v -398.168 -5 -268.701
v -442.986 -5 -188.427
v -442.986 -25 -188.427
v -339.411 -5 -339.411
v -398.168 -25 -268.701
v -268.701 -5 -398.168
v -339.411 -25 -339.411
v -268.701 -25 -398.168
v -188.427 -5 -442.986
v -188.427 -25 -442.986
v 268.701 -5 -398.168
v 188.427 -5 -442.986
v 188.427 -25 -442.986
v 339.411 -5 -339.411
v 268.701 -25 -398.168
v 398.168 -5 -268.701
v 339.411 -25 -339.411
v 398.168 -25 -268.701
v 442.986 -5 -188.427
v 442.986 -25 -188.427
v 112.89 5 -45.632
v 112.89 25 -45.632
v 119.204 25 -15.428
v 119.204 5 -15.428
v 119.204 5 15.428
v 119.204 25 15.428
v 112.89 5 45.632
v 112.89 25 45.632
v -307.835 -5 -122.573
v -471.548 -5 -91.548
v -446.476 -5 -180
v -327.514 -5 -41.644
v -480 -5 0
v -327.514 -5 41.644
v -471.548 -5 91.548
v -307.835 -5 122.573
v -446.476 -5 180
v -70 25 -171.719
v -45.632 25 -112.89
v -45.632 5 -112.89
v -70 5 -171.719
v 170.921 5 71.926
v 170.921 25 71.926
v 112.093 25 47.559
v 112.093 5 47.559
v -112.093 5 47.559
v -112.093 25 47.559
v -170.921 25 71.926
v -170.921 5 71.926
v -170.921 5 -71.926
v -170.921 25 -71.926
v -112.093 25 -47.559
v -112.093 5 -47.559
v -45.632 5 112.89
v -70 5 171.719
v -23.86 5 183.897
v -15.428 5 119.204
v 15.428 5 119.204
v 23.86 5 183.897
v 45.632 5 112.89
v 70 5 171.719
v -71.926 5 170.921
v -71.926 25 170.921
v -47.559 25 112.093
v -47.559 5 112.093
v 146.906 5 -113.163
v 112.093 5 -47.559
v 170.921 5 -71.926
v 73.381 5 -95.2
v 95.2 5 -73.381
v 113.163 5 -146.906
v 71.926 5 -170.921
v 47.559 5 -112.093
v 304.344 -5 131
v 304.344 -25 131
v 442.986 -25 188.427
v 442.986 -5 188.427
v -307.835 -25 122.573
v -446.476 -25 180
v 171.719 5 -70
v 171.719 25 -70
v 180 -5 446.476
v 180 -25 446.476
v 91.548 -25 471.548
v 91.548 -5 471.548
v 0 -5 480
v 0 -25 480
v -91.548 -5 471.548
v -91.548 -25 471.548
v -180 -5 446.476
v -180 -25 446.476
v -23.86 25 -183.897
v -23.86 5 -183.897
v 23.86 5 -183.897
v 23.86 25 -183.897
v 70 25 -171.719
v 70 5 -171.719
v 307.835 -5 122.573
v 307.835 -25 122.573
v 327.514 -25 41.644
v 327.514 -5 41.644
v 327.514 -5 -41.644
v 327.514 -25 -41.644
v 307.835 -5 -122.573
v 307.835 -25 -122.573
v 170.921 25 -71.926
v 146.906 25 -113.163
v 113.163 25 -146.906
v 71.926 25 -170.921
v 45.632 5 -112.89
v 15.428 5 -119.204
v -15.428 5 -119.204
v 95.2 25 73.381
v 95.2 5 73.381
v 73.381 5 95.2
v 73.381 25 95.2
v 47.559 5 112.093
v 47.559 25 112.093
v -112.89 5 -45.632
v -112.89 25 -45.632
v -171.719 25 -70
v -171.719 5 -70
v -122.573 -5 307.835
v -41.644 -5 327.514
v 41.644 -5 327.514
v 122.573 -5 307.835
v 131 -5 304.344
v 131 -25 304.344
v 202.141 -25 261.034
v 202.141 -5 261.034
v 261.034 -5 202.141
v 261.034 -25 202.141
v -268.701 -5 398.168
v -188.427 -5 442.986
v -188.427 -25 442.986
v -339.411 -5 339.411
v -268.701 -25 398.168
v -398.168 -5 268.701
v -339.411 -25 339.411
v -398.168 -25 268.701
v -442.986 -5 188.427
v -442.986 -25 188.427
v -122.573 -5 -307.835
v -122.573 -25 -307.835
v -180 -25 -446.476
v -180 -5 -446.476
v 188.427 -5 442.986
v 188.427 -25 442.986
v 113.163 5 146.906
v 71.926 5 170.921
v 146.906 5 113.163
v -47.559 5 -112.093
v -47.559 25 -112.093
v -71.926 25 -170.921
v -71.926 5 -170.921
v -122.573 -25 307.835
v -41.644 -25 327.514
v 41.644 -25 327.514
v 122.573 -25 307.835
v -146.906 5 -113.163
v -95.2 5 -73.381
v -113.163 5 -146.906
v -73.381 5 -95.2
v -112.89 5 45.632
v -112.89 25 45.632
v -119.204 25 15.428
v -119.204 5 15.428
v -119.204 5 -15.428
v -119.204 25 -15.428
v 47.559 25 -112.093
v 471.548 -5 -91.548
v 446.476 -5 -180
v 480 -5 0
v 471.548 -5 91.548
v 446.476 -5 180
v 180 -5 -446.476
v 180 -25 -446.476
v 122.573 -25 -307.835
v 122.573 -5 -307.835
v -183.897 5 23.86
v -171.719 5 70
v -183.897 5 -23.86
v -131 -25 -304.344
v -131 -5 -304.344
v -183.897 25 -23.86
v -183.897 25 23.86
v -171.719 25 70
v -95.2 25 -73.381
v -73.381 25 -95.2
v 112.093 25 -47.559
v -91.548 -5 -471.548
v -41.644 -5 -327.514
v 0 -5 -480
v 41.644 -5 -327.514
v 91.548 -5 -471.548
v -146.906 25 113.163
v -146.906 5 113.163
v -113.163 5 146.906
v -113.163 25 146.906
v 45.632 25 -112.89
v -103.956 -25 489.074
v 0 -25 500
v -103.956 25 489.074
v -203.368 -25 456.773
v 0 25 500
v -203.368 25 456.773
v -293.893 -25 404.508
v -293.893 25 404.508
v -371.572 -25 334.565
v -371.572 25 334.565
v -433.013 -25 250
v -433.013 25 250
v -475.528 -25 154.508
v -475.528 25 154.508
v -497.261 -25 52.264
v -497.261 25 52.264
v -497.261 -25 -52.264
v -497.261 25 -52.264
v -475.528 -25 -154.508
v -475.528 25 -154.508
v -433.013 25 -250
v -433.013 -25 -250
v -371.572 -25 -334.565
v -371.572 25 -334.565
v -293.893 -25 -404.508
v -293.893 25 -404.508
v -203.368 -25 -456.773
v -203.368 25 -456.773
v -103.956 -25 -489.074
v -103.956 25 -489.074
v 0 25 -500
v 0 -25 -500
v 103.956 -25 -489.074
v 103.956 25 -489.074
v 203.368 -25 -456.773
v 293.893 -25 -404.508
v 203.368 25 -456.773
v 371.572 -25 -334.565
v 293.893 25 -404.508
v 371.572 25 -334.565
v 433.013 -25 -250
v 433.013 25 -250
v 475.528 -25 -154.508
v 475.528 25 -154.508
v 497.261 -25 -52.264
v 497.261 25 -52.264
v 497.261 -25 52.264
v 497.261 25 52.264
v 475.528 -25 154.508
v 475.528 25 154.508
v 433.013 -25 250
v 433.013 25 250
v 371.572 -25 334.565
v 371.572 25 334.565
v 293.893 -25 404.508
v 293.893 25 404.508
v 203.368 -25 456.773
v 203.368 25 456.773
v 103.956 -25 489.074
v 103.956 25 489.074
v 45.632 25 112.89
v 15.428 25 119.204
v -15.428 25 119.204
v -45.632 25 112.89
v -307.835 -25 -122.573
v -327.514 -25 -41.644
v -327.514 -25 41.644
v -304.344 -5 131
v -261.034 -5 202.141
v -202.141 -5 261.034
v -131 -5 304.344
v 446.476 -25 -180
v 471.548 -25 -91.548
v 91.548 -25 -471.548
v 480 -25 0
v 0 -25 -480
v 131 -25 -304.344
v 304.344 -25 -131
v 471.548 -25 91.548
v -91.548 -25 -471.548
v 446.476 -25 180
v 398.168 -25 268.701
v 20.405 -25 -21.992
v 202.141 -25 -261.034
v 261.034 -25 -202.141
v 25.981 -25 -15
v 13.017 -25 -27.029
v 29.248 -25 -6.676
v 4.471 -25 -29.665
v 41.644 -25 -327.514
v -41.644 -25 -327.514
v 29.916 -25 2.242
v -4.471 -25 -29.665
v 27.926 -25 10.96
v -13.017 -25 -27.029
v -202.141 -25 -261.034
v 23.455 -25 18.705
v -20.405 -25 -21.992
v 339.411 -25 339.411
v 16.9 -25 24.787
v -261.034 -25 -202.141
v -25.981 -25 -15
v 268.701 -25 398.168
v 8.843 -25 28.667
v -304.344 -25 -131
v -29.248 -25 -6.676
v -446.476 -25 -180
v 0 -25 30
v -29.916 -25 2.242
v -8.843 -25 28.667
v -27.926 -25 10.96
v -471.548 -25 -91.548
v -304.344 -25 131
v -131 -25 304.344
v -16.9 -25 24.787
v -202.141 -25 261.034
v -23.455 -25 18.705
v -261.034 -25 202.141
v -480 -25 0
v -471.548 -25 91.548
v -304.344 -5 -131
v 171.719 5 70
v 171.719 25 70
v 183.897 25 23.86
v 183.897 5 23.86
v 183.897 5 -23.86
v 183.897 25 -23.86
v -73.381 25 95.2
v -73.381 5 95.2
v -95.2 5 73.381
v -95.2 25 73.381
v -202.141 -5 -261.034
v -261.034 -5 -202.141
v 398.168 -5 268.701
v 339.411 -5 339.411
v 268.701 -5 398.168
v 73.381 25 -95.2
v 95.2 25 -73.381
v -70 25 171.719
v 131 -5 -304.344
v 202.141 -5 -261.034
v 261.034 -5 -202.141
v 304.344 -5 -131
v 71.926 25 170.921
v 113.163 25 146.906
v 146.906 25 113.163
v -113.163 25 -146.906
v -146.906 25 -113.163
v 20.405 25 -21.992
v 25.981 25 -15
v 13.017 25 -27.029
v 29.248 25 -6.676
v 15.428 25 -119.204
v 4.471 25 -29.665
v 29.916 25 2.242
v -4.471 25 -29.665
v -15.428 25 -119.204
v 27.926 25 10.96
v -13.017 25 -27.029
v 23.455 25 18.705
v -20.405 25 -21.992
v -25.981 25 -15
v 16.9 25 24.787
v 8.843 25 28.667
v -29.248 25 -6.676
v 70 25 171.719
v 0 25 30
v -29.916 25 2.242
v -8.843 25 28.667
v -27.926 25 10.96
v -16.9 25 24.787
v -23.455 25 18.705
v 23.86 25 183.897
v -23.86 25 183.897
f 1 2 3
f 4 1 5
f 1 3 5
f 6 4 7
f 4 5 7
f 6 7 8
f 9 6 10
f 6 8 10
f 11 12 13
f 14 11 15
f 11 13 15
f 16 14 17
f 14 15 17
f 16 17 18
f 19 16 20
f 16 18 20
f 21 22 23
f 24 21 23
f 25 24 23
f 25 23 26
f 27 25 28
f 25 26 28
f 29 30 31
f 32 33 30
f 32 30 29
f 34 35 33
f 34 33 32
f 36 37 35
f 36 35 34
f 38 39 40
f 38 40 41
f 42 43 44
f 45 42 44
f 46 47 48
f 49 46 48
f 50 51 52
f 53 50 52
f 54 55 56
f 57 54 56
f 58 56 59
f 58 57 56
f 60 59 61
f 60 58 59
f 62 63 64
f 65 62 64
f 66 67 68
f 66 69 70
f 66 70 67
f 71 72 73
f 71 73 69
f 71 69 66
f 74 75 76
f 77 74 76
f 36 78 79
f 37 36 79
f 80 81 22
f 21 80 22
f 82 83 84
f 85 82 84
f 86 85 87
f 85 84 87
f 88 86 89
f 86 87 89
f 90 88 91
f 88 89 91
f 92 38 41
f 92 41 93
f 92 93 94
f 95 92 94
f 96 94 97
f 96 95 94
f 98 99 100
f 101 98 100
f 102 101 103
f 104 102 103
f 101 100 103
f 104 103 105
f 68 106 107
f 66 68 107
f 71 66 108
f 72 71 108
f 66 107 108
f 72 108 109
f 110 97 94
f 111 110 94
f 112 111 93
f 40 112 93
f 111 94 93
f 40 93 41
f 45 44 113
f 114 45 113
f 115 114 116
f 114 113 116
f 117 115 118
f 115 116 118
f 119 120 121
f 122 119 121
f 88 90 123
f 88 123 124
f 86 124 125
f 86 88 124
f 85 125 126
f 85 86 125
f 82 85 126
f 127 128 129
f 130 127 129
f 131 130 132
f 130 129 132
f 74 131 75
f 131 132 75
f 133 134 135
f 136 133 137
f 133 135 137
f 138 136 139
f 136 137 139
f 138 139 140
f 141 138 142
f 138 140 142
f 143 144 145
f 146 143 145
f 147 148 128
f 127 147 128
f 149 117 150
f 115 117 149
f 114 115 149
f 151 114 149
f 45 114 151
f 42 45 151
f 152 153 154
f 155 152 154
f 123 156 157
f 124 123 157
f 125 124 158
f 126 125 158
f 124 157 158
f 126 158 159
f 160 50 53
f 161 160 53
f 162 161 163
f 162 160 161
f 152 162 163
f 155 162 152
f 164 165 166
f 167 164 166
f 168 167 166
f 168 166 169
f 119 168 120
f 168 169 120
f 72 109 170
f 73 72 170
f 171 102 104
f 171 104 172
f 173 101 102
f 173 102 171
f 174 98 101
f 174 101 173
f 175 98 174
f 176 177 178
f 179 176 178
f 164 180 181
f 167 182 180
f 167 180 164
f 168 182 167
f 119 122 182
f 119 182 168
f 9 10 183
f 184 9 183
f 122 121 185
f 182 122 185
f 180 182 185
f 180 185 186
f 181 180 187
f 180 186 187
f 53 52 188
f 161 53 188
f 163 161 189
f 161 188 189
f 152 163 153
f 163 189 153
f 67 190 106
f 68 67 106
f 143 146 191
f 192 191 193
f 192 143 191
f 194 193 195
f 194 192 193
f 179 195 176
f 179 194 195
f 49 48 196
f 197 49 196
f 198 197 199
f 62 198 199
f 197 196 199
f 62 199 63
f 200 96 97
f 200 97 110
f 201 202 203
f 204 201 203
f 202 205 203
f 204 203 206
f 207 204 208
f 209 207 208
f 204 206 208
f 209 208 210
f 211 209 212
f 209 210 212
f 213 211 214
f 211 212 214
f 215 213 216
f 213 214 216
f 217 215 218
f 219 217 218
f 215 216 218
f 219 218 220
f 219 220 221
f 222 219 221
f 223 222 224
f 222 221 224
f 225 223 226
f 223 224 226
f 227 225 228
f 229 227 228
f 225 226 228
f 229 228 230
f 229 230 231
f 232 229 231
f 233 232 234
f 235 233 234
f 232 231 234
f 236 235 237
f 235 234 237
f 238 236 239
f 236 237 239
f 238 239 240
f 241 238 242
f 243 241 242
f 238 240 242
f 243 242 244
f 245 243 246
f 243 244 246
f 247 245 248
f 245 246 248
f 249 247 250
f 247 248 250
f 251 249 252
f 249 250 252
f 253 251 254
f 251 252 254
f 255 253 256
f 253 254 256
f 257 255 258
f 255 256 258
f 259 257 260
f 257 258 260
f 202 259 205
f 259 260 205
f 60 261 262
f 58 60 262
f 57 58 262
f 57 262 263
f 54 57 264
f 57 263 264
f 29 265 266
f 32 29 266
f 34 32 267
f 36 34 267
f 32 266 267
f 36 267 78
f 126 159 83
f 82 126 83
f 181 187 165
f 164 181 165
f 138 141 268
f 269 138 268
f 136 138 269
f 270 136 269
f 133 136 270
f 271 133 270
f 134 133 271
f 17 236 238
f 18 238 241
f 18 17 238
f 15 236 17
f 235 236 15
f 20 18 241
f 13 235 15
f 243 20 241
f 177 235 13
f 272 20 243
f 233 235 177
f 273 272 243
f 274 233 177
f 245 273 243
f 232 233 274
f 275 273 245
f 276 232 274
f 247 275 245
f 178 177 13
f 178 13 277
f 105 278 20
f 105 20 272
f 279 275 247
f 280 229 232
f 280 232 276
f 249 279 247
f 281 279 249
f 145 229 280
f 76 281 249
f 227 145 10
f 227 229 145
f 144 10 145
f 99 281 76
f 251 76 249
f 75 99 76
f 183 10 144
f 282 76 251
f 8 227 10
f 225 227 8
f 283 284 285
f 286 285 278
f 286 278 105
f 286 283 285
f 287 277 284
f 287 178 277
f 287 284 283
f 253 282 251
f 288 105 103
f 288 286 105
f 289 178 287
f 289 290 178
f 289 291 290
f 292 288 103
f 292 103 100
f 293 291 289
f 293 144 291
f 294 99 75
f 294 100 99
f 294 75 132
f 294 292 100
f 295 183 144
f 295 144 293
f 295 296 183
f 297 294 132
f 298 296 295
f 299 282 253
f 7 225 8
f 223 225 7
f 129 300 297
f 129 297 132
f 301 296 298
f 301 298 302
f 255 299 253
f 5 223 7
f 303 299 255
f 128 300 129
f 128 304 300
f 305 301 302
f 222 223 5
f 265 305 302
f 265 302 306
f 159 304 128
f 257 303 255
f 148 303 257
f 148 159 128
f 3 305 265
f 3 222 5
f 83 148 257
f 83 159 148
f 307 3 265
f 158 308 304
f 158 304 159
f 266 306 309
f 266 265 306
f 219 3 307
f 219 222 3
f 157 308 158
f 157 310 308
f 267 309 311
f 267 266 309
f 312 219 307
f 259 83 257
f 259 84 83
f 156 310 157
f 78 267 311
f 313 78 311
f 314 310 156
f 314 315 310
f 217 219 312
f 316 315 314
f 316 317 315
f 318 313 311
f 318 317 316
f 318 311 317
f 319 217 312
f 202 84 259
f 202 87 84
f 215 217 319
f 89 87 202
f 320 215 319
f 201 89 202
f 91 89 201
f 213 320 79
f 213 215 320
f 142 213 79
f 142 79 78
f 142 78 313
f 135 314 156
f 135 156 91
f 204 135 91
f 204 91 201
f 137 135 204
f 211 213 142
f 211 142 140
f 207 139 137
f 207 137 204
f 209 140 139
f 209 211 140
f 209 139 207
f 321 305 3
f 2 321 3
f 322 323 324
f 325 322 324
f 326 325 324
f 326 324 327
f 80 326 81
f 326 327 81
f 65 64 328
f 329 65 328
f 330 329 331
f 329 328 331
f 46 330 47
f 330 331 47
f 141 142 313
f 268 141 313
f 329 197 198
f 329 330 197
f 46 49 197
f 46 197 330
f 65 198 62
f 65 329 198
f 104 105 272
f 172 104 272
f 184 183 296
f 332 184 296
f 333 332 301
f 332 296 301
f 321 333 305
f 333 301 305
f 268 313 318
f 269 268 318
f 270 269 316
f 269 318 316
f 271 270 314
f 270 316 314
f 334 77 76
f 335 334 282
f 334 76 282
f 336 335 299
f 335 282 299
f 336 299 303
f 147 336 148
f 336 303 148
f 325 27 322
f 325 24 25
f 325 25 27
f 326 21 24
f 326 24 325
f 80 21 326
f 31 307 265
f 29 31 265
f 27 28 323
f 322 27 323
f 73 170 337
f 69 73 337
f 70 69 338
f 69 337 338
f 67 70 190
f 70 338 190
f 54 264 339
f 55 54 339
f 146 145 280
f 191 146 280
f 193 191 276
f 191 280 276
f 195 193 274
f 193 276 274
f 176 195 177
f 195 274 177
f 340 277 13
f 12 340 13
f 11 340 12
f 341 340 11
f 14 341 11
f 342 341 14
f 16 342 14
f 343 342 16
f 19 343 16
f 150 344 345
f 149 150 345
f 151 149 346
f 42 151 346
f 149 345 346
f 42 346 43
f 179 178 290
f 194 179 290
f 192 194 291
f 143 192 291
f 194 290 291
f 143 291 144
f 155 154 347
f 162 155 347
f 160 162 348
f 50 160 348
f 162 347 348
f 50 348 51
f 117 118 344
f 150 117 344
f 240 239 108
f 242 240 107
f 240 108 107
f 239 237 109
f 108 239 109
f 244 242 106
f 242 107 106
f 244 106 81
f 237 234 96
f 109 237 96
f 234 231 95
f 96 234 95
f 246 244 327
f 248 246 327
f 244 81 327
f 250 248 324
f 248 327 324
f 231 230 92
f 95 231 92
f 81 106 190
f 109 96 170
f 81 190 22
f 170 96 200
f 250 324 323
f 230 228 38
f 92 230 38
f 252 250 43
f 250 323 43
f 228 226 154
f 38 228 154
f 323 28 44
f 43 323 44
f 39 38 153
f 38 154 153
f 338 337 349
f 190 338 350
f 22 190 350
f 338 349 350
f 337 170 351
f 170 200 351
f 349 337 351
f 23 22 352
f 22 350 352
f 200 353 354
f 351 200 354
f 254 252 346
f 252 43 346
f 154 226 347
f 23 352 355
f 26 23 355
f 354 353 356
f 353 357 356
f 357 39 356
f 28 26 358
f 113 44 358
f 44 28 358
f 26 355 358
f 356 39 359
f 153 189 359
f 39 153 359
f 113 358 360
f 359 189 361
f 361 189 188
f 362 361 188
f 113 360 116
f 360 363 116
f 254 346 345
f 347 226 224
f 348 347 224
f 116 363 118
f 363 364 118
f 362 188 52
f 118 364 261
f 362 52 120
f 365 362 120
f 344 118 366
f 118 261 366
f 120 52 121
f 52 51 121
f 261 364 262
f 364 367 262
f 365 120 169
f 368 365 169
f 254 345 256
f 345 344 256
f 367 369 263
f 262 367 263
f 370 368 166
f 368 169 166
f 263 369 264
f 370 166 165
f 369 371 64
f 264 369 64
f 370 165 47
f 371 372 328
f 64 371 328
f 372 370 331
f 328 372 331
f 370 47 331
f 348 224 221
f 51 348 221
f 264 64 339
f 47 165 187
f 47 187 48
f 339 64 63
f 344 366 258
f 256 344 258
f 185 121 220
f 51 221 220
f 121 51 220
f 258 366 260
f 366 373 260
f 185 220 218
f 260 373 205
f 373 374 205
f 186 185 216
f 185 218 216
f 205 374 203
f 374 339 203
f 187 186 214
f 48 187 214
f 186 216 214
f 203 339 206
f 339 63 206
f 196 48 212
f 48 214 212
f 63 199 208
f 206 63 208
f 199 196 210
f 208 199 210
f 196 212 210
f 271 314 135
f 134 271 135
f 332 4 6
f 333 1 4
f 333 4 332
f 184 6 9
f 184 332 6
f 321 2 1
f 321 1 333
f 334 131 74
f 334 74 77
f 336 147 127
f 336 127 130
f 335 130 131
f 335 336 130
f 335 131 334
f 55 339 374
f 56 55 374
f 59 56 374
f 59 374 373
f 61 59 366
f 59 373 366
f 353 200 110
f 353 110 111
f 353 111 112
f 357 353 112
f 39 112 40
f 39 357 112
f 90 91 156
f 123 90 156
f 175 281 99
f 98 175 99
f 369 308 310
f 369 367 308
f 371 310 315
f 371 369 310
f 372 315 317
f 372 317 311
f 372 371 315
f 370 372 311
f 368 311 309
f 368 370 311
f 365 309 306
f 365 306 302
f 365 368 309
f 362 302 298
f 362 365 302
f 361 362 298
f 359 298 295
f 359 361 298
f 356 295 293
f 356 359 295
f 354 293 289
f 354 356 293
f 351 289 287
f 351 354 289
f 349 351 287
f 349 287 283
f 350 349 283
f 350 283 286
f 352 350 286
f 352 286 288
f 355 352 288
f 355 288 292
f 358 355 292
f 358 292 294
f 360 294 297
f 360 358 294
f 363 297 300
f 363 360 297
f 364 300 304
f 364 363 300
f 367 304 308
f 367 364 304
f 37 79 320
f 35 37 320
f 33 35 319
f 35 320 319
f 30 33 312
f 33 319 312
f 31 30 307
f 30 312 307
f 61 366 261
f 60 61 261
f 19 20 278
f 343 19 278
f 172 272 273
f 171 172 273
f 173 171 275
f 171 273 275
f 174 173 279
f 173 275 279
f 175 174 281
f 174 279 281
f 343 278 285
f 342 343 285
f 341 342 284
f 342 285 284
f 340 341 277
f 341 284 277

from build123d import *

# Parameters (mm, degrees)
SKETCH1_W          = 470
SKETCH1_H          = 50
CUT_EXTRUDE1_DEPTH = 20
CUT_EXTRUDE2_DEPTH = 20


with BuildPart() as part:
    # Sketch1 → Revolve1 (revolve)
    with BuildSketch(Plane(origin=(0, 0, 0), x_dir=(0, 0, -1), z_dir=(1, 0, 0))):
        with Locations((-265, 0)):
            Rectangle(SKETCH1_W, SKETCH1_H)
    revolve(axis=Axis((0, 285.555555556, 0), (0, -1, 0)))

    # Sketch2 → Cut-Extrude1 (cut)
    with BuildSketch(Plane.XZ.offset(25)):
        with BuildLine():
            Line((-180, 446.476151588), (-122.573000413, 307.835110337))
            ThreePointArc((-122.573000413, 307.835110337), (0, 330), (122.573000413, 307.835110337))
            Line((122.573000413, 307.835110337), (180, 446.476151588))
            ThreePointArc((180, 446.476151588), (0, 480), (-180, 446.476151588))
        make_face()
        with BuildLine():
            Line((188.427093812, 442.985535039), (131.000094225, 304.344493789))
            ThreePointArc((131.000094225, 304.344493789), (233.345237792, 233.345237792), (304.344493789, 131.000094225))
            Line((304.344493789, 131.000094225), (442.985535039, 188.427093812))
            ThreePointArc((442.985535039, 188.427093812), (339.41125497, 339.41125497), (188.427093812, 442.985535039))
        make_face()
        with BuildLine():
            Line((446.476151588, 180), (307.835110337, 122.573000413))
            ThreePointArc((307.835110337, 122.573000413), (330, 0), (307.835110337, -122.573000413))
            Line((307.835110337, -122.573000413), (446.476151588, -180))
            ThreePointArc((446.476151588, -180), (480, 0), (446.476151588, 180))
        make_face()
        with BuildLine():
            Line((442.985535039, -188.427093812), (304.344493789, -131.000094225))
            ThreePointArc((304.344493789, -131.000094225), (233.345237792, -233.345237792), (131.000094225, -304.344493789))
            Line((131.000094225, -304.344493789), (188.427093812, -442.985535039))
            ThreePointArc((188.427093812, -442.985535039), (339.41125497, -339.41125497), (442.985535039, -188.427093812))
        make_face()
        with BuildLine():
            Line((180, -446.476151588), (122.573000413, -307.835110337))
            ThreePointArc((122.573000413, -307.835110337), (0, -330), (-122.573000413, -307.835110337))
            Line((-122.573000413, -307.835110337), (-180, -446.476151588))
            ThreePointArc((-180, -446.476151588), (0, -480), (180, -446.476151588))
        make_face()
        with BuildLine():
            Line((-188.427093812, -442.985535039), (-131.000094225, -304.344493789))
            ThreePointArc((-131.000094225, -304.344493789), (-233.345237792, -233.345237792), (-304.344493789, -131.000094225))
            Line((-304.344493789, -131.000094225), (-442.985535039, -188.427093812))
            ThreePointArc((-442.985535039, -188.427093812), (-339.41125497, -339.41125497), (-188.427093812, -442.985535039))
        make_face()
        with BuildLine():
            Line((-446.476151588, -180), (-307.835110337, -122.573000413))
            ThreePointArc((-307.835110337, -122.573000413), (-330, 0), (-307.835110337, 122.573000413))
            Line((-307.835110337, 122.573000413), (-446.476151588, 180))
            ThreePointArc((-446.476151588, 180), (-480, 0), (-446.476151588, -180))
        make_face()
        with BuildLine():
            Line((-442.985535039, 188.427093812), (-304.344493789, 131.000094225))
            ThreePointArc((-304.344493789, 131.000094225), (-233.345237792, 233.345237792), (-131.000094225, 304.344493789))
            Line((-131.000094225, 304.344493789), (-188.427093812, 442.985535039))
            ThreePointArc((-188.427093812, 442.985535039), (-339.41125497, 339.41125497), (-442.985535039, 188.427093812))
        make_face()
    extrude(amount=-CUT_EXTRUDE1_DEPTH, mode=Mode.SUBTRACT)

    # Sketch3 → Cut-Extrude2 (cut)
    with BuildSketch(Plane(origin=(0, 25, 0), x_dir=(1, 0, 0), z_dir=(0, 1, 0))):
        with BuildLine():
            Line((-45.632403393, 112.890460705), (-70, 171.719042916))
            ThreePointArc((-70, 171.719042916), (0, 185.438479556), (70, 171.719042916))
            Line((70, 171.719042916), (45.632403393, 112.890460705))
            ThreePointArc((45.632403393, 112.890460705), (0, 120), (-45.632403393, 112.890460705))
        make_face()
        with BuildLine():
            Line((112.092592177, 47.558628415), (170.921174388, 71.926225022))
            ThreePointArc((170.921174388, 71.926225022), (131.124806387, 131.124806387), (71.926225022, 170.921174388))
            Line((71.926225022, 170.921174388), (47.558628415, 112.092592177))
            ThreePointArc((47.558628415, 112.092592177), (84.852813742, 84.852813742), (112.092592177, 47.558628415))
        make_face()
        with BuildLine():
            Line((112.890460705, -45.632403393), (171.719042916, -70))
            ThreePointArc((171.719042916, -70), (185.438479556, 0), (171.719042916, 70))
            Line((171.719042916, 70), (112.890460705, 45.632403393))
            ThreePointArc((112.890460705, 45.632403393), (120, 0), (112.890460705, -45.632403393))
        make_face()
        with BuildLine():
            Line((47.558628415, -112.092592177), (71.926225022, -170.921174388))
            ThreePointArc((71.926225022, -170.921174388), (131.124806387, -131.124806387), (170.921174388, -71.926225022))
            Line((170.921174388, -71.926225022), (112.092592177, -47.558628415))
            ThreePointArc((112.092592177, -47.558628415), (84.852813742, -84.852813742), (47.558628415, -112.092592177))
        make_face()
        with BuildLine():
            Line((-45.632403393, -112.890460705), (-70, -171.719042916))
            ThreePointArc((-70, -171.719042916), (0, -185.438479556), (70, -171.719042916))
            Line((70, -171.719042916), (45.632403393, -112.890460705))
            ThreePointArc((45.632403393, -112.890460705), (0, -120), (-45.632403393, -112.890460705))
        make_face()
        with BuildLine():
            Line((-112.092592177, -47.558628415), (-170.921174388, -71.926225022))
            ThreePointArc((-170.921174388, -71.926225022), (-131.124806387, -131.124806387), (-71.926225022, -170.921174388))
            Line((-71.926225022, -170.921174388), (-47.558628415, -112.092592177))
            ThreePointArc((-47.558628415, -112.092592177), (-84.852813742, -84.852813742), (-112.092592177, -47.558628415))
        make_face()
        with BuildLine():
            Line((-112.890460705, 45.632403393), (-171.719042916, 70))
            ThreePointArc((-171.719042916, 70), (-185.438479556, 0), (-171.719042916, -70))
            Line((-171.719042916, -70), (-112.890460705, -45.632403393))
            ThreePointArc((-112.890460705, -45.632403393), (-120, 0), (-112.890460705, 45.632403393))
        make_face()
        with BuildLine():
            Line((-47.558628415, 112.092592177), (-71.926225022, 170.921174388))
            ThreePointArc((-71.926225022, 170.921174388), (-131.124806387, 131.124806387), (-170.921174388, 71.926225022))
            Line((-170.921174388, 71.926225022), (-112.092592177, 47.558628415))
            ThreePointArc((-112.092592177, 47.558628415), (-84.852813742, 84.852813742), (-47.558628415, 112.092592177))
        make_face()
    extrude(amount=-CUT_EXTRUDE2_DEPTH, mode=Mode.SUBTRACT)


solid = part.part
